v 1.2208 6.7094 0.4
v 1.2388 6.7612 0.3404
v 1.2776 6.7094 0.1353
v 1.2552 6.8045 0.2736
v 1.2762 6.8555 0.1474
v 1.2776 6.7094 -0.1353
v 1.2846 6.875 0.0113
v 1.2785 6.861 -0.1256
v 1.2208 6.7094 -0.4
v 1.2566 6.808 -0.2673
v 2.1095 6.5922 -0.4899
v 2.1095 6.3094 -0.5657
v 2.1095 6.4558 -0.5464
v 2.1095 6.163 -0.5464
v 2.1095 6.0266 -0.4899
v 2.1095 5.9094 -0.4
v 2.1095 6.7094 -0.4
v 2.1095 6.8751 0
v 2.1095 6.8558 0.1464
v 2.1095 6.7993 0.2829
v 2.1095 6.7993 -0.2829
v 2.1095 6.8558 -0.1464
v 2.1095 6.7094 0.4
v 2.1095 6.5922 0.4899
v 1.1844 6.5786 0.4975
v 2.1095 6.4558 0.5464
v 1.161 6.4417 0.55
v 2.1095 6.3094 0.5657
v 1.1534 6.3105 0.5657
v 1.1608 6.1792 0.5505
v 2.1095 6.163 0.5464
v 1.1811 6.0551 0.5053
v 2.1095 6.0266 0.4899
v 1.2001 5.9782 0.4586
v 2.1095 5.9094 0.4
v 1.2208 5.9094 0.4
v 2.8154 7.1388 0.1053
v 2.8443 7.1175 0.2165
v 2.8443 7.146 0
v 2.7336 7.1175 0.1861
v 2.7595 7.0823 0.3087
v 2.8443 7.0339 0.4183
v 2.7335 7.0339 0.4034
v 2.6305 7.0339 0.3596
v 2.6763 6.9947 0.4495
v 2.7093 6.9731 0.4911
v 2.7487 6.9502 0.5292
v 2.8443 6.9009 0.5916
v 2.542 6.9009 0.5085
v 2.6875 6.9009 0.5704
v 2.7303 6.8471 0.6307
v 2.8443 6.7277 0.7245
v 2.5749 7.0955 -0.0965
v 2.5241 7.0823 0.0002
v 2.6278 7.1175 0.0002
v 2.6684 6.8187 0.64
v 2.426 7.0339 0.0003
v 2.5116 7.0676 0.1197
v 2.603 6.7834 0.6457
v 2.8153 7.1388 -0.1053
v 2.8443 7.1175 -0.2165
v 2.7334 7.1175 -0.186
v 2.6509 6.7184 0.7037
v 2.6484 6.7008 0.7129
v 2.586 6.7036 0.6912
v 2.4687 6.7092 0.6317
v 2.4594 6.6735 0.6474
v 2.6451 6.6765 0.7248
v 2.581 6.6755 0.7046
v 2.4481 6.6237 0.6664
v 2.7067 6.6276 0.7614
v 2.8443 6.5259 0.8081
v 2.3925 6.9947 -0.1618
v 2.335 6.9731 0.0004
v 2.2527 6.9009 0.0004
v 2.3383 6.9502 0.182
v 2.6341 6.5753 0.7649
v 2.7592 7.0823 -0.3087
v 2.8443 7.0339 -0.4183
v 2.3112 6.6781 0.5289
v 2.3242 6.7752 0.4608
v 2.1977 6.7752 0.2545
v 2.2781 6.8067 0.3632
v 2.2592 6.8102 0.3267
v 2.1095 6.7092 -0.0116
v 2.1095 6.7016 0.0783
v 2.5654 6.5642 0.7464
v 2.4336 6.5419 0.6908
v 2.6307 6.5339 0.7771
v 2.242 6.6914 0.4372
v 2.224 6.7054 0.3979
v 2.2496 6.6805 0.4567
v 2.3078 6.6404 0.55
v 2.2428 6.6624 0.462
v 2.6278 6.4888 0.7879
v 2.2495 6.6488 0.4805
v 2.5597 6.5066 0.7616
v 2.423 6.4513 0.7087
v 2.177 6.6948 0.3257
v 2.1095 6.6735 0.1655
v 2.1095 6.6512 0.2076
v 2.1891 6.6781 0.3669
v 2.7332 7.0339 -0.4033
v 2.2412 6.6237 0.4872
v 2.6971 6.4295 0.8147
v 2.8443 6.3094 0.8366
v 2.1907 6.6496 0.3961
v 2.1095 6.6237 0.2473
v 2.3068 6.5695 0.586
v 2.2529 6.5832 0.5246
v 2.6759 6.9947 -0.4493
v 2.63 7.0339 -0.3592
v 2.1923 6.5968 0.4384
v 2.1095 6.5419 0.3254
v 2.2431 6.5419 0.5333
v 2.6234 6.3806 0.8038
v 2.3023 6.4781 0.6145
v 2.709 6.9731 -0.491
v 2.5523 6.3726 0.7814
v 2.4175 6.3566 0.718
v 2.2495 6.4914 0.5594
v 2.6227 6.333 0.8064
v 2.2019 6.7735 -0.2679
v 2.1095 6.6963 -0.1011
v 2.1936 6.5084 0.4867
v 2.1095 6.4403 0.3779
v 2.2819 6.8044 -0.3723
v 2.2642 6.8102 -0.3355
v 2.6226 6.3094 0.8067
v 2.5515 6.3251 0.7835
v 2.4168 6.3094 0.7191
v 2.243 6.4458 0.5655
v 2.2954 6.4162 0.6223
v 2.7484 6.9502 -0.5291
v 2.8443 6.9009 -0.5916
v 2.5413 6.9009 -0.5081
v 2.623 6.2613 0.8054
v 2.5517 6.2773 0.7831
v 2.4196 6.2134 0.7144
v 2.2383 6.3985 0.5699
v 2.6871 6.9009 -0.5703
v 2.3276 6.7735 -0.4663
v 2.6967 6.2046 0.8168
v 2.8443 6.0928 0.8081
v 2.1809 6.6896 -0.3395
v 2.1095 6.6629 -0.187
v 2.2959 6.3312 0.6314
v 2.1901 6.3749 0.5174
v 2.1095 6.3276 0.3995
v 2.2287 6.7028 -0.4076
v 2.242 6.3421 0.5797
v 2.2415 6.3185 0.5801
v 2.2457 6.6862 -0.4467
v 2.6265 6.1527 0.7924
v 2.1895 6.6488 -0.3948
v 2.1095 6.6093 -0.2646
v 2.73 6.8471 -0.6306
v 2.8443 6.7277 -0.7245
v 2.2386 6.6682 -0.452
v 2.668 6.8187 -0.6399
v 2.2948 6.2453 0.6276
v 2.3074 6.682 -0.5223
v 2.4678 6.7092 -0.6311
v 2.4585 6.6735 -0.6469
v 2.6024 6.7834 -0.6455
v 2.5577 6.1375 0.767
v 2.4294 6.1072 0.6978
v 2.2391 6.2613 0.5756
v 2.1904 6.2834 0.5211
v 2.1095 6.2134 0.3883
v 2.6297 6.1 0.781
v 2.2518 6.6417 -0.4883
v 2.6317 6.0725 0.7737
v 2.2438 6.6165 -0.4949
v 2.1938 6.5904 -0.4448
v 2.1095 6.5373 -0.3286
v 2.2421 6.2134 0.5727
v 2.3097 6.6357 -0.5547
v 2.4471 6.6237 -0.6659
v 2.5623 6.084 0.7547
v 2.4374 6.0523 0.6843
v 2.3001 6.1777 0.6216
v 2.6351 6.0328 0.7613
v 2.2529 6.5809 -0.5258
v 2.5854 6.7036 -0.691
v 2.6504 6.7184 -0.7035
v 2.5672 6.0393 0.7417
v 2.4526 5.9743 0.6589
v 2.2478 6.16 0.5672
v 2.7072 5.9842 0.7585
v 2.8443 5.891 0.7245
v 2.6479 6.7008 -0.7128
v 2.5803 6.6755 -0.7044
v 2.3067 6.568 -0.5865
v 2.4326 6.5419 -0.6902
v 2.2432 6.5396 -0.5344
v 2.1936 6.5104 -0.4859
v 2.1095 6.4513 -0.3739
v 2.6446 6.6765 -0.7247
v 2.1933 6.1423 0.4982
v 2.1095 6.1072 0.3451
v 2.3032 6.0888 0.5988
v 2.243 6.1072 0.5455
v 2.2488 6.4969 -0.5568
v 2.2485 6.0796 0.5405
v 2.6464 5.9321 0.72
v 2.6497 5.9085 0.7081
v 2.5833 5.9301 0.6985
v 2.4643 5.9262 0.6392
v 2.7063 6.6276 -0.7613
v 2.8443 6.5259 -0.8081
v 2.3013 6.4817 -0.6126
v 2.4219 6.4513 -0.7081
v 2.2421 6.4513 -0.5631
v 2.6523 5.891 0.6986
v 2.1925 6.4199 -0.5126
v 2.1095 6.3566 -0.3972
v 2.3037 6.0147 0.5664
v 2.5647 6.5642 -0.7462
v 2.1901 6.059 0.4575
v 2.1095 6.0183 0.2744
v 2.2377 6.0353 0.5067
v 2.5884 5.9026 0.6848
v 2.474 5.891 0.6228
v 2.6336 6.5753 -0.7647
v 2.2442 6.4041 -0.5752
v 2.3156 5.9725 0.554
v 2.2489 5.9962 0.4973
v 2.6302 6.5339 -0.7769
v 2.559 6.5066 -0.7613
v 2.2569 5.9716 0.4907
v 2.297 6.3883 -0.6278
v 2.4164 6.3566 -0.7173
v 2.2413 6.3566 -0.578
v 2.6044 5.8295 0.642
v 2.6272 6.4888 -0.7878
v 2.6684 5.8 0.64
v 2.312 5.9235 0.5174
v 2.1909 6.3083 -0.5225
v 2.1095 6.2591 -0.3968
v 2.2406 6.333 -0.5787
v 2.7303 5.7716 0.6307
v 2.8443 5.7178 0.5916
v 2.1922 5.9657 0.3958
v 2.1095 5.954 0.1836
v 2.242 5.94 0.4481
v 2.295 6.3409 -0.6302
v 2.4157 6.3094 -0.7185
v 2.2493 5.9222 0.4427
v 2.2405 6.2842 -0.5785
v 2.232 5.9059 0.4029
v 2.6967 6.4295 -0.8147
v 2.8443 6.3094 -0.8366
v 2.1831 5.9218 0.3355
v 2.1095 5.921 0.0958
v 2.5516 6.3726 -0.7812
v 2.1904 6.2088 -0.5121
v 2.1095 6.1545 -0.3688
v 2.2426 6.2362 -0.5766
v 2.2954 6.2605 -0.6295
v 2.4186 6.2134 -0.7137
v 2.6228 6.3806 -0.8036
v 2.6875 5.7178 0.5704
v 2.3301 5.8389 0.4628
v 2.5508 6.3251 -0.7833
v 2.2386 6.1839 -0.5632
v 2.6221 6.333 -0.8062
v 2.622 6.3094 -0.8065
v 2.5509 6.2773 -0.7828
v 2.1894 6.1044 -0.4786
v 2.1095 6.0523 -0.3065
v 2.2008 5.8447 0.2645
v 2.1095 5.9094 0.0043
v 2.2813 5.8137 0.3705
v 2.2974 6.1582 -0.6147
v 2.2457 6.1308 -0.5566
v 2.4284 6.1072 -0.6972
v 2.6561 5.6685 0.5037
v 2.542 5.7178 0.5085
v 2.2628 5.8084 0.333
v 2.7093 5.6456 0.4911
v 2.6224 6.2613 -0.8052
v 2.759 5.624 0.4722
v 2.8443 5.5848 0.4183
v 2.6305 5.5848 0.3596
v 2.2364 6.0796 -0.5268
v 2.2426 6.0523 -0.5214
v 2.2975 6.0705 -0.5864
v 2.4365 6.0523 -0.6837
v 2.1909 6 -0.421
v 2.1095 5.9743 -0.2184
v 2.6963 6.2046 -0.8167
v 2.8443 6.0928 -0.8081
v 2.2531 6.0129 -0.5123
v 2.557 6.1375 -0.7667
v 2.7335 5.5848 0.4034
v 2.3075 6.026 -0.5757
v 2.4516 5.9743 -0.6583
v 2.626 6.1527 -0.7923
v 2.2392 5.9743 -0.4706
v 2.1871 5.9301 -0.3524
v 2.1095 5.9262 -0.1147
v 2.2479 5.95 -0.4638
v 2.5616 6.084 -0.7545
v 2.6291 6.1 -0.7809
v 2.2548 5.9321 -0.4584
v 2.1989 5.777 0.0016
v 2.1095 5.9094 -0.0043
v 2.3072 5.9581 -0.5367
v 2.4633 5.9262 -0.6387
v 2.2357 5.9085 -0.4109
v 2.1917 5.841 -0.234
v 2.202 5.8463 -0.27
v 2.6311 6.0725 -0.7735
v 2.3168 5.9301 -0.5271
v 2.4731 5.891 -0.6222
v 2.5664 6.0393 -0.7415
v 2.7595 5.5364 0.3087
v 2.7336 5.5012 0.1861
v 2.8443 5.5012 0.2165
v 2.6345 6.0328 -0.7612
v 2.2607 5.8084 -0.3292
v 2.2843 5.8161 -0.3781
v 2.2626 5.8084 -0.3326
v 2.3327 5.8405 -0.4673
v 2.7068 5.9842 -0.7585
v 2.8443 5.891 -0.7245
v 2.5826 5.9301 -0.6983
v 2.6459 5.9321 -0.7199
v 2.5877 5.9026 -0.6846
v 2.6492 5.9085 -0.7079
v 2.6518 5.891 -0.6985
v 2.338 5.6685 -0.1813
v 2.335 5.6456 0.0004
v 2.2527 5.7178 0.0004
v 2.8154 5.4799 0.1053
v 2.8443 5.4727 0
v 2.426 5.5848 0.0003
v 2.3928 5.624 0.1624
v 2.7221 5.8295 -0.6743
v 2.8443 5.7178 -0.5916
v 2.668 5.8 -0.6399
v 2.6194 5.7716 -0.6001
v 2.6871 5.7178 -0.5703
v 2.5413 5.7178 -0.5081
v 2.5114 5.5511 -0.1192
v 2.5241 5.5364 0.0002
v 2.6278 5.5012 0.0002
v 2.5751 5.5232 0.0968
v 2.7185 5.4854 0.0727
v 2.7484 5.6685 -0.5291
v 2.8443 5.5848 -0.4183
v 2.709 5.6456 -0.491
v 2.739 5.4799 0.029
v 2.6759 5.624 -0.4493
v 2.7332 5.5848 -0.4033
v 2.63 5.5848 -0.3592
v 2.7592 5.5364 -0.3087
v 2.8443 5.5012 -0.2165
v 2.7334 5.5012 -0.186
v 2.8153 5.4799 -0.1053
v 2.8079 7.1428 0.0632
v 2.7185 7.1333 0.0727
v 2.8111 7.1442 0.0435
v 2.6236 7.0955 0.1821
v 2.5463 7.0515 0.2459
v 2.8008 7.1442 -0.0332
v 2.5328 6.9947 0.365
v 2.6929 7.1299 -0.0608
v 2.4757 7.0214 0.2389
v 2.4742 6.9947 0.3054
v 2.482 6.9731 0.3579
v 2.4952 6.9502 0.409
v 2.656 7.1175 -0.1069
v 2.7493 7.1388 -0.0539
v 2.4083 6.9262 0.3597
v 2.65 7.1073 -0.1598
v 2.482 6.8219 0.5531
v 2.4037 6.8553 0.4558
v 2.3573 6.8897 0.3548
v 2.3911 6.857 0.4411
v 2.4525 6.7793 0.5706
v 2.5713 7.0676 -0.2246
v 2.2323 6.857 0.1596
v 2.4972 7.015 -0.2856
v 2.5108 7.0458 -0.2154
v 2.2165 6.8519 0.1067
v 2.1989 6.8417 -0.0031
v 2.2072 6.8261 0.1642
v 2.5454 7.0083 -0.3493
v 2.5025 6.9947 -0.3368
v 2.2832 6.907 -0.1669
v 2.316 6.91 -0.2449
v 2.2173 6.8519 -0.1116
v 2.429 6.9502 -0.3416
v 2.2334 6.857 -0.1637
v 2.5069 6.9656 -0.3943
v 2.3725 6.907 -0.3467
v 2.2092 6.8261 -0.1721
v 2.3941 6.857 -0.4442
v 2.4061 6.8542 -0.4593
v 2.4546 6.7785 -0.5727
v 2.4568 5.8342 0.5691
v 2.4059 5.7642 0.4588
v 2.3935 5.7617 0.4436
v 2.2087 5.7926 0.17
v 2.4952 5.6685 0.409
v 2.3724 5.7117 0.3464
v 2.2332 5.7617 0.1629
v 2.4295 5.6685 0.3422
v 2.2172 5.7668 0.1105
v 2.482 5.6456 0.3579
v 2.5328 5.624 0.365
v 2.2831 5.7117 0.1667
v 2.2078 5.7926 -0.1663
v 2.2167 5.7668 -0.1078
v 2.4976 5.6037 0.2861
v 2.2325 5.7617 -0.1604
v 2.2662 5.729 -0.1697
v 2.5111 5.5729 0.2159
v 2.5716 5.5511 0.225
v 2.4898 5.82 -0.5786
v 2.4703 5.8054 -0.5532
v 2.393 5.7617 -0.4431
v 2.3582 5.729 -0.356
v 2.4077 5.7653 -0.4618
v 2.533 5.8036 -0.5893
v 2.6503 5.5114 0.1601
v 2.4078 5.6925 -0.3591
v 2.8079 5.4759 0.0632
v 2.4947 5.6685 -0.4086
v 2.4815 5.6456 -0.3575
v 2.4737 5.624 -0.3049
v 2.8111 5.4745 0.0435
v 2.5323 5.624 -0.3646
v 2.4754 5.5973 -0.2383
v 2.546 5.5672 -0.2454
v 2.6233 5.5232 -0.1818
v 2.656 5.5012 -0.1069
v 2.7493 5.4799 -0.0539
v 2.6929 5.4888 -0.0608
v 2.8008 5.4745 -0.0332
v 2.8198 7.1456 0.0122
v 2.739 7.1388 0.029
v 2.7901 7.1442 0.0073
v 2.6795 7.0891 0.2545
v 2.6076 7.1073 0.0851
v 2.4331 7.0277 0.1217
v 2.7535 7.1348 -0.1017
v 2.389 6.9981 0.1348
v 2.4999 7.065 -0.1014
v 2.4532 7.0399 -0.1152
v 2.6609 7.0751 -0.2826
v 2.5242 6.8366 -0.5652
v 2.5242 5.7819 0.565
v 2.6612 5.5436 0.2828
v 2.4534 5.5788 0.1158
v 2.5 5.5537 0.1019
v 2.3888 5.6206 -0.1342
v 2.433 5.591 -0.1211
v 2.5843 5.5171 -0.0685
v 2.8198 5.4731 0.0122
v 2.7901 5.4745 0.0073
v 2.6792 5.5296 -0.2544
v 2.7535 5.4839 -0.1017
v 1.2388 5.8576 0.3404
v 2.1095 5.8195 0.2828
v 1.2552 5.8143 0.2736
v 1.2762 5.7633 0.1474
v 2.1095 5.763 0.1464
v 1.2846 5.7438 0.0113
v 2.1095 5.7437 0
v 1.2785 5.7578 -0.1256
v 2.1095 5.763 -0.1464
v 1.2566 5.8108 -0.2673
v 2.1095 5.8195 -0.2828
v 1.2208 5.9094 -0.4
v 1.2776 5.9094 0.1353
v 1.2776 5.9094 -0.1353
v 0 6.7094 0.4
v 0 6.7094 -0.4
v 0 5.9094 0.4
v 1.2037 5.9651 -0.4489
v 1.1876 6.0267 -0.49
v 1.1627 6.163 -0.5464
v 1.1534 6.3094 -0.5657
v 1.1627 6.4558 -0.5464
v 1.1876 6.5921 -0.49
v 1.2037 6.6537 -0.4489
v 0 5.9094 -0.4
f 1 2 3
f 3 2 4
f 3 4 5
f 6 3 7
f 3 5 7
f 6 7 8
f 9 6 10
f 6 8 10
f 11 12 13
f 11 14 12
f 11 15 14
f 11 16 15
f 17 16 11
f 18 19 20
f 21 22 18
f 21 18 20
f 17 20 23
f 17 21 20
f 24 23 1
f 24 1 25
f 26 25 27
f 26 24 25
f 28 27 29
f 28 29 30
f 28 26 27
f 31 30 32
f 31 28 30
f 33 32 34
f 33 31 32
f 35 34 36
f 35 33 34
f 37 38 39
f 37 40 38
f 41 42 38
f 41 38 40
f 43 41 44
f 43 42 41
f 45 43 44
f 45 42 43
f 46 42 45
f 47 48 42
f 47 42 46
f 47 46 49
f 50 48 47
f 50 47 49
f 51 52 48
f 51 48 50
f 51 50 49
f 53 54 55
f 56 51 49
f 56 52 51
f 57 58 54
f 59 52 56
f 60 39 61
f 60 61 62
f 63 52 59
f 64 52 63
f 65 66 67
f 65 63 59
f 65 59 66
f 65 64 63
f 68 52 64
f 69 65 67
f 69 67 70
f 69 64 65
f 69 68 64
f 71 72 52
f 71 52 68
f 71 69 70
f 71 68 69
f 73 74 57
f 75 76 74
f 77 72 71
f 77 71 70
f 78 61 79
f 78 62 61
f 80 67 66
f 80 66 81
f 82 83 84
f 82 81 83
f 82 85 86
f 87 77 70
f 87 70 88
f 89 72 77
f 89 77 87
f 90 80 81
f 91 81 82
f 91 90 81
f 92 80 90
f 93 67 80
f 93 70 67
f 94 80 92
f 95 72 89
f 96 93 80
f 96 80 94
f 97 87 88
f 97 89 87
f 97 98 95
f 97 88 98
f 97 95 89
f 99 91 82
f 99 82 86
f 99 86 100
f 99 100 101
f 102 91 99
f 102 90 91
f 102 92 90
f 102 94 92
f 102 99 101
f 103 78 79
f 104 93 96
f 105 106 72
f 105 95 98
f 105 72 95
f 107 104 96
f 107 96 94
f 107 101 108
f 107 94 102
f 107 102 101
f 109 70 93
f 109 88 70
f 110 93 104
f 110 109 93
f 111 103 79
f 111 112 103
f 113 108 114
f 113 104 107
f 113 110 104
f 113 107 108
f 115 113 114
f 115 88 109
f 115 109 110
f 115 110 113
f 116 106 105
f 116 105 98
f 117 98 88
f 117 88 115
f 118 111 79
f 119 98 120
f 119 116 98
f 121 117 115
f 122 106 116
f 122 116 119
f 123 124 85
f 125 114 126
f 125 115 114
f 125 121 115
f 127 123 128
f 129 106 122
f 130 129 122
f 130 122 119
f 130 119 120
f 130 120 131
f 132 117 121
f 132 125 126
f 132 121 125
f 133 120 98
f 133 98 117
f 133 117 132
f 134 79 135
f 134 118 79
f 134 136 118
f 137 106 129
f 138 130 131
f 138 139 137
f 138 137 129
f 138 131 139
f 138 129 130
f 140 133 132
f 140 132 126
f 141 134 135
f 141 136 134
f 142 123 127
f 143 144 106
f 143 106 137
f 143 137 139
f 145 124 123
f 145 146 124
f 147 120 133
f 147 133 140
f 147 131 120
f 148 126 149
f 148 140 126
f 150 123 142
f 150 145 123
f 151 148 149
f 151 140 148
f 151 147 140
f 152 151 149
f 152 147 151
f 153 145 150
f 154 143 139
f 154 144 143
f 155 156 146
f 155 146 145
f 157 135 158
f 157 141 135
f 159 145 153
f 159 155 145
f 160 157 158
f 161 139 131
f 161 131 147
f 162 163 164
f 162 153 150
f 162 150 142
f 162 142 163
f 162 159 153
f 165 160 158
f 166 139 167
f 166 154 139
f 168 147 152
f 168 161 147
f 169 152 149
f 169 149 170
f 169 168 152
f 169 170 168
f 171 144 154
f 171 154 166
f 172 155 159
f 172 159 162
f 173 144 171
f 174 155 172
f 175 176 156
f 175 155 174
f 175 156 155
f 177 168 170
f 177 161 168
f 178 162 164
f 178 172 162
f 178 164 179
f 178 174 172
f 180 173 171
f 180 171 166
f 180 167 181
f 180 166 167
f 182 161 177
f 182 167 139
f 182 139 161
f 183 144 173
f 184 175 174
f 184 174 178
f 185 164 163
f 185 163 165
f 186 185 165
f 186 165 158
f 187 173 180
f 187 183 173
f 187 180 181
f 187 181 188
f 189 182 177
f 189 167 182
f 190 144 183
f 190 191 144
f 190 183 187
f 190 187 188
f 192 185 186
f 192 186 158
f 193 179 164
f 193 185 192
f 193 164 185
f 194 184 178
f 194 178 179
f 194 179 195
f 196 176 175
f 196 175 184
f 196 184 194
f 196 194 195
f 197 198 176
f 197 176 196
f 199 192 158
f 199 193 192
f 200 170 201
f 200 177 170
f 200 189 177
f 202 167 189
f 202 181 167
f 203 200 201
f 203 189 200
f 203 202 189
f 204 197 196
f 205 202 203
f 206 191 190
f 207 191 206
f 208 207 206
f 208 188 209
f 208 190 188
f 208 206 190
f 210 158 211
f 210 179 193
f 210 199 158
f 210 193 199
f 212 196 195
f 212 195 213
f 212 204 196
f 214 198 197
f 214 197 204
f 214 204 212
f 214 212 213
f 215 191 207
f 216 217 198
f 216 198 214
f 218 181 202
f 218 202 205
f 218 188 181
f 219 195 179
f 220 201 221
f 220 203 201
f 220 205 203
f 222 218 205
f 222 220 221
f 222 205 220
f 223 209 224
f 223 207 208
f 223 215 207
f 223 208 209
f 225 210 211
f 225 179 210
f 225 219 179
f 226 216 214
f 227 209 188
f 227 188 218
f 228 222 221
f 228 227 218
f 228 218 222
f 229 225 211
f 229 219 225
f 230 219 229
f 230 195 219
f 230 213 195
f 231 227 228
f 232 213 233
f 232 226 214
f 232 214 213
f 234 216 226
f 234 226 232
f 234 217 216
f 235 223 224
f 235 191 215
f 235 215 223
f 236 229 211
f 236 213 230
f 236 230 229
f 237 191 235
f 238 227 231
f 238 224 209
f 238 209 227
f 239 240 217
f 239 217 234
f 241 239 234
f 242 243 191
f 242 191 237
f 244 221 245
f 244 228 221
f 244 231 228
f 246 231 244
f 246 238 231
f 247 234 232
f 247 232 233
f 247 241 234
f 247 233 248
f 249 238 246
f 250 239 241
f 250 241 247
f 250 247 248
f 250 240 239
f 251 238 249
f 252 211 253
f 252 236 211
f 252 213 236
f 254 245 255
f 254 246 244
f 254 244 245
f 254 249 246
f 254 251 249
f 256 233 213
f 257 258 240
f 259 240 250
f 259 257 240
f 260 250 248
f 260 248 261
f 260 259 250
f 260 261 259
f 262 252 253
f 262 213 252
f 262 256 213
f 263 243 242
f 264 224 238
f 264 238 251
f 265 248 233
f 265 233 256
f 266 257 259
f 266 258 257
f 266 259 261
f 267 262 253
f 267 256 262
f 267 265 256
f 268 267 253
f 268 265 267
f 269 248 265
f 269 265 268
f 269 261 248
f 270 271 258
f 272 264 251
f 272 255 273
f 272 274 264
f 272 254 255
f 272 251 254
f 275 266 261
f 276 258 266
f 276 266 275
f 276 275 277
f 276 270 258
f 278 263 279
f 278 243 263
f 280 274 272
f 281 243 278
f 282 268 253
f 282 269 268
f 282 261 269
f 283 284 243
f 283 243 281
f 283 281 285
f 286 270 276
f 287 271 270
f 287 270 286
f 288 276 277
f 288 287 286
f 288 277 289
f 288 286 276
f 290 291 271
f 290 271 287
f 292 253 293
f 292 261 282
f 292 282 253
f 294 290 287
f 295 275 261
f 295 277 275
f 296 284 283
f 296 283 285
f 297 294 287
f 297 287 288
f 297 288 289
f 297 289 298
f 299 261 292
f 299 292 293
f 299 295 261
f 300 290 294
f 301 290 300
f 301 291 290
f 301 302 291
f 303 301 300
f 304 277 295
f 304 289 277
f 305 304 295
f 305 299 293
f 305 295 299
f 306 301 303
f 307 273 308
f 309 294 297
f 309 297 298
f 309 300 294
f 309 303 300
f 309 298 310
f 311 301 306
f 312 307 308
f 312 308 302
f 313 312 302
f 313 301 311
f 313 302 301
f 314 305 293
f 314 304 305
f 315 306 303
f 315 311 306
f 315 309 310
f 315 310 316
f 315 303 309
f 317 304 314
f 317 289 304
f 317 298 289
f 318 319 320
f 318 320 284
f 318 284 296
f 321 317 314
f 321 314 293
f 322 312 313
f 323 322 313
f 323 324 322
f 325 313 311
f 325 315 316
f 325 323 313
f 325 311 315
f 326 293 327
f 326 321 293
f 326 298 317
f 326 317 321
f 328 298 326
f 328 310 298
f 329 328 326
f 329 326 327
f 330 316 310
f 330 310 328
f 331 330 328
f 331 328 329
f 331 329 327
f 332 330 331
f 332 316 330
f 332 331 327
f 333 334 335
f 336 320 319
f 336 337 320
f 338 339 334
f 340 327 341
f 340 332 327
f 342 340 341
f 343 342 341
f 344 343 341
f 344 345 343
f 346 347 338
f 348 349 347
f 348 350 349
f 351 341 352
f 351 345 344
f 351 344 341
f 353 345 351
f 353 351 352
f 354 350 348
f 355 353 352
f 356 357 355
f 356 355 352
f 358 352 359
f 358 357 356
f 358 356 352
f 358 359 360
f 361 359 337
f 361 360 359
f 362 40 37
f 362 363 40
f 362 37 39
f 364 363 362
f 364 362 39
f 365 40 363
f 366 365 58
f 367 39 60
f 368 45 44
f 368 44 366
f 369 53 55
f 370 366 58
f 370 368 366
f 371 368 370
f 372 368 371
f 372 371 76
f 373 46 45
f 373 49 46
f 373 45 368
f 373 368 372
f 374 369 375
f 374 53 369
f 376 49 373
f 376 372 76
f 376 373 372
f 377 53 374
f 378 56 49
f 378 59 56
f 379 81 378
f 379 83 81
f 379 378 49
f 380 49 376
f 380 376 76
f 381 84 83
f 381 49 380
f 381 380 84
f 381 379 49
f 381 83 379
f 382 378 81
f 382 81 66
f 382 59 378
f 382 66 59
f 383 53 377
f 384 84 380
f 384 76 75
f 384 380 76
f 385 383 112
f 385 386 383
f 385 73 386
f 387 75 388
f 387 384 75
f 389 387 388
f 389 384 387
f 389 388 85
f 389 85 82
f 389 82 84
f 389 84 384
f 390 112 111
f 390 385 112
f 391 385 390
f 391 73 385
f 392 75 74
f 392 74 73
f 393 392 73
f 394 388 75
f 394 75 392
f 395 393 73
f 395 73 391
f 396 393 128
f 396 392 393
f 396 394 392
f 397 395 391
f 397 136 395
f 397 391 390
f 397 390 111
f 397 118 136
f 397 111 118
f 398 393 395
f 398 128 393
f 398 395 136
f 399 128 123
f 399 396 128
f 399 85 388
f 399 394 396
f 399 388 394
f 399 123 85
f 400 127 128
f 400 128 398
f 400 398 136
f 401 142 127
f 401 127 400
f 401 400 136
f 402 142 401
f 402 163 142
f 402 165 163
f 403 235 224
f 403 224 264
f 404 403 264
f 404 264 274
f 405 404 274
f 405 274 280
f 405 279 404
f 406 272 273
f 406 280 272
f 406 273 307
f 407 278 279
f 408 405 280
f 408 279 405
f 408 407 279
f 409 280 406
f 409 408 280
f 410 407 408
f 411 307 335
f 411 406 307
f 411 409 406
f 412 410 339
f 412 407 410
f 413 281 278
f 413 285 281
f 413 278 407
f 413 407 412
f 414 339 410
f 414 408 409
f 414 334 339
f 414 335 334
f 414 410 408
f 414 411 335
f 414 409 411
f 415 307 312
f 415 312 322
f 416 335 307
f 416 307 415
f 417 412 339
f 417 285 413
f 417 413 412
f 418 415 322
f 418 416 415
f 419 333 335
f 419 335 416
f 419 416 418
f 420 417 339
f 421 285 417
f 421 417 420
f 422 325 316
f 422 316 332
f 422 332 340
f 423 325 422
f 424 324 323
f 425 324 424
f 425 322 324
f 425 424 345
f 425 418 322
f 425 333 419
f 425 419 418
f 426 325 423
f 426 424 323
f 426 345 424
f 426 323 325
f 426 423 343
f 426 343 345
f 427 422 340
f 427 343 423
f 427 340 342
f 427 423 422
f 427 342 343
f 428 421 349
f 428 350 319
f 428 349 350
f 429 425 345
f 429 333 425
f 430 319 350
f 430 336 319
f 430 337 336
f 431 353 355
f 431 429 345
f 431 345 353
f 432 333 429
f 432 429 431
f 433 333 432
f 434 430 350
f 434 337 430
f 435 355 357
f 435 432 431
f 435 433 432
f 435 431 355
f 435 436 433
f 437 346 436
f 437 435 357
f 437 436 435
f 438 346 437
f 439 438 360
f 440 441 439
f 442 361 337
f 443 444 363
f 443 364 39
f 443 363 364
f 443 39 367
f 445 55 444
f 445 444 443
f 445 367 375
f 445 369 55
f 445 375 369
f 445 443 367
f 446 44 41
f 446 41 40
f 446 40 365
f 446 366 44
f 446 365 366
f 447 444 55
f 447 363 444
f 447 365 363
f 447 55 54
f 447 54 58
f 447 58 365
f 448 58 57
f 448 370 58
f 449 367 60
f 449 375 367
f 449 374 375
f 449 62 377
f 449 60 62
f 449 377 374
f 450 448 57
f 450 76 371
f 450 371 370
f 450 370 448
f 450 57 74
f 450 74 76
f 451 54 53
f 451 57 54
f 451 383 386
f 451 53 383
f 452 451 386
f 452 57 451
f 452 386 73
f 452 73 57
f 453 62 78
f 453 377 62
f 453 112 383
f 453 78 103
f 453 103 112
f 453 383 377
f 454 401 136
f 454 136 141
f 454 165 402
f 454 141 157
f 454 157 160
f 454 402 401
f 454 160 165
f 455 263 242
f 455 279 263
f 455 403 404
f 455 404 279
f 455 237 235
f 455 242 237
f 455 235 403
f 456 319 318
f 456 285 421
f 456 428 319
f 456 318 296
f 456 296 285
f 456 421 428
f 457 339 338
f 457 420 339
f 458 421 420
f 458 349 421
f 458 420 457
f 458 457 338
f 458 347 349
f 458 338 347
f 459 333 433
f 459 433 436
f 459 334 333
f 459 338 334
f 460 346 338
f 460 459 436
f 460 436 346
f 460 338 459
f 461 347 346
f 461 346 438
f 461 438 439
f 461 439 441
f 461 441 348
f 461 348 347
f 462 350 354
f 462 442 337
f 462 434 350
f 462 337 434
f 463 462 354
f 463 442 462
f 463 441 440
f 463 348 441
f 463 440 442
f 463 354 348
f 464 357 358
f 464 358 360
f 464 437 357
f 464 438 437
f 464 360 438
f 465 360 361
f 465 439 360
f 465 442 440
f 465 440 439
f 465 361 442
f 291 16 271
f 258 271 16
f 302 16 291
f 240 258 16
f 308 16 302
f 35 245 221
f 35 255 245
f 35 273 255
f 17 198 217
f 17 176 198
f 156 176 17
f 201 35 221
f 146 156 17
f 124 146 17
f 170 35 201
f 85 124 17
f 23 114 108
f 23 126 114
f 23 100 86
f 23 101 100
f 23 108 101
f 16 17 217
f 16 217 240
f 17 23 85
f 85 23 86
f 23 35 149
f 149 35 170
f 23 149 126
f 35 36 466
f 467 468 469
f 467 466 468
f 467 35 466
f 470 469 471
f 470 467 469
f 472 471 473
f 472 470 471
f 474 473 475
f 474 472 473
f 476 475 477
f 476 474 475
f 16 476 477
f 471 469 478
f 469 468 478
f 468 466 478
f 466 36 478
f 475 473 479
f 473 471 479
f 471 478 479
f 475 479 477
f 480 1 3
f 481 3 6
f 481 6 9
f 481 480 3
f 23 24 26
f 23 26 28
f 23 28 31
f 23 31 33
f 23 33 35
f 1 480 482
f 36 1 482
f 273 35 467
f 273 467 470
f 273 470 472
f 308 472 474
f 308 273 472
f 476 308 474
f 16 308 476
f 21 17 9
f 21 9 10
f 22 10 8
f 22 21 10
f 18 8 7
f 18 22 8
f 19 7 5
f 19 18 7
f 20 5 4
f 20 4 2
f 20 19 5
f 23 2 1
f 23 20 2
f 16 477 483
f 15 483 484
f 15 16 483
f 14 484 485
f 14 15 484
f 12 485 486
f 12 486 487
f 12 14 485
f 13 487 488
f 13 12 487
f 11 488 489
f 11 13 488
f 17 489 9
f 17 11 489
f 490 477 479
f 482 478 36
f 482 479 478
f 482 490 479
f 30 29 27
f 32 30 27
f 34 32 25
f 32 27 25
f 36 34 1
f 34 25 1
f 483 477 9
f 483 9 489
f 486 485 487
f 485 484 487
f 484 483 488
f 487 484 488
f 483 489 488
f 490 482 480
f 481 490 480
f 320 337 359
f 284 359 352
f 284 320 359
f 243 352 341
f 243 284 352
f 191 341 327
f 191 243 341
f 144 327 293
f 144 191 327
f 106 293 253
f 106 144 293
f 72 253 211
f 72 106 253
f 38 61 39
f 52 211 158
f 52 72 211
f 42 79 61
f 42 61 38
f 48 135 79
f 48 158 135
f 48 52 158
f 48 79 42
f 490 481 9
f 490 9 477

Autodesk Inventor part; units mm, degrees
ref_plane "XZ Plane" through (0, 0, 0) normal (0, 1, 0) x (-1, 0, 0)
ref_plane "XY Plane" through (0, 0, 0) normal (0, 0, 1) x (1, 0, 0)
sketch "Boceto1" plane through (0, 0, 0) normal (1, 0, 0) x (0, 1, 0)
  line L0 (1.0744, 1.2847) -> (7.0094, 1.2847)
  line L1 (1.1029, 0.9847) -> (6.9809, 0.9847)
  arc A0 (1.0744, 1.2847) -> (0, 0) centre (1.3052, 0) ccw
  arc A1 (1.1029, 0.9847) -> (0.3, 0) centre (1.3052, 0) ccw
  arc A2 (8.0838, 0) -> (7.0094, 1.2847) centre (6.7786, 0) ccw
  arc A3 (7.7838, 0) -> (6.9809, 0.9847) centre (6.7786, 0) ccw
  line L2 (6.7094, 0.4) -> (6.7094, -0.4)
  line L3 (5.9094, -0.4) -> (5.9094, 0.4)
  line L4 (0.3, 0) -> (0, 0)
  line L5 (7.7838, 0) -> (8.0838, 0)
  circle A4 centre (1.3052, 0) radius 0.45
  line L6 (6.7094, 0.4) -> (5.9094, 0.4)
  line L7 (6.7094, -0.4) -> (5.9094, -0.4)
  point P0 (0, 0)
extrude "Extrusión1" add sketch "Boceto1" along normal blind 2.1095 contours L2 L7 L3 L6
sketch "Boceto2" plane through (2.1095, 0, 0) normal (1, 0, 0) x (0, 0, -1)
  line L0 (0.4, 6.7094) -> (-0.4, 6.7094) projected
  line L1 (-0.4, 6.7094) -> (-0.4, 5.9094) projected
  line L2 (-0.4, 5.9094) -> (0.4, 5.9094) projected
  line L3 (0.4, 5.9094) -> (0.4, 6.7094) projected
  line L4 (0.4, 6.7094) -> (-0.4, 6.7094) projected
  line L5 (-0.4, 6.7094) -> (-0.4, 5.9094) projected
  circle A0 centre (0, 6.3094) radius 0.5657
  point P0 (0, 0)
extrude "Extrusión2" add sketch "Boceto2" against normal blind 2.1095 contours A0 L3 | L0 A0 | L1 A0 | A0 L2
sketch "Boceto3" plane through (0, 0, 0) normal (1, 0, 0) x (0, 1, 0)
  line L0 (1.0744, 1.2847) -> (7.0094, 1.2847)
  line L1 (1.1029, 0.9847) -> (6.9809, 0.9847)
  arc A0 (1.0744, 1.2847) -> (0, 0) centre (1.3052, 0) ccw
  arc A1 (1.1029, 0.9847) -> (0.3, 0) centre (1.3052, 0) ccw
  arc A2 (8.0838, 0) -> (7.0094, 1.2847) centre (6.7786, 0) ccw
  arc A3 (7.7838, 0) -> (6.9809, 0.9847) centre (6.7786, 0) ccw
  line L2 (0.3, 0) -> (0, 0)
  line L3 (7.7838, 0) -> (8.0838, 0)
  line L4 (7.7838, 0) -> (0.3, 0)
  point P0 (0, 0)
revolve "Revolución1" cut sketch "Boceto3" angle 360 about axis through (0, 7.7838, 0) along (0, -1, 0)
sketch "Boceto4" plane through (0, 0, 0) normal (1, 0, 0) x (0, 1, 0)
  line L0 (1.0744, 1.2847) -> (7.0094, 1.2847)
  line L1 (1.1029, 0.9847) -> (6.9809, 0.9847)
  arc A0 (1.0744, 1.2847) -> (0, 0) centre (1.3052, 0) ccw
  arc A1 (1.1029, 0.9847) -> (0.3, 0) centre (1.3052, 0) ccw
  arc A2 (8.0838, 0) -> (7.0094, 1.2847) centre (6.7786, 0) ccw
  arc A3 (7.7838, 0) -> (6.9809, 0.9847) centre (6.7786, 0) ccw
  line L2 (6.7094, 0.4) -> (6.7094, -0.4)
  line L3 (5.9094, -0.4) -> (5.9094, 0.4)
  line L4 (0.3, 0) -> (0, 0)
  line L5 (7.7838, 0) -> (8.0838, 0)
  circle A4 centre (1.3052, 0) radius 0.45
  line L6 (6.7094, 0.4) -> (5.9094, 0.4)
  line L7 (6.7094, -0.4) -> (5.9094, -0.4)
  point P0 (0, 0)
extrude "Extrusión3" add sketch "Boceto4" along normal blind 2.1095 contours L2 L7 L3 L6
ref_plane "Plano de trabajo1" through (2.8443, 0, 0) normal (1, 0, 0) x (0, 1, 0)
sketch "Boceto5" plane through (2.8443, 0, 0) normal (1, 0, 0) x (0, 1, 0)
  circle A0 centre (6.3094, 0) radius 0.5657 projected
  line L0 (7.146, 0) -> (5.4727, 0)
  arc A1 (7.146, 0) -> (5.4727, 0) centre (6.3094, 0) ccw
  point P0 (0, 0)
revolve "Revolución2" add sketch "Boceto5" angle 180 about axis through (2.8443, 7.146, 0) along (0, -1, 0) picked at (6.4505, 0.2153) contours L0 A0 | A0 L0 A1
properties part number "soportebrazo"
